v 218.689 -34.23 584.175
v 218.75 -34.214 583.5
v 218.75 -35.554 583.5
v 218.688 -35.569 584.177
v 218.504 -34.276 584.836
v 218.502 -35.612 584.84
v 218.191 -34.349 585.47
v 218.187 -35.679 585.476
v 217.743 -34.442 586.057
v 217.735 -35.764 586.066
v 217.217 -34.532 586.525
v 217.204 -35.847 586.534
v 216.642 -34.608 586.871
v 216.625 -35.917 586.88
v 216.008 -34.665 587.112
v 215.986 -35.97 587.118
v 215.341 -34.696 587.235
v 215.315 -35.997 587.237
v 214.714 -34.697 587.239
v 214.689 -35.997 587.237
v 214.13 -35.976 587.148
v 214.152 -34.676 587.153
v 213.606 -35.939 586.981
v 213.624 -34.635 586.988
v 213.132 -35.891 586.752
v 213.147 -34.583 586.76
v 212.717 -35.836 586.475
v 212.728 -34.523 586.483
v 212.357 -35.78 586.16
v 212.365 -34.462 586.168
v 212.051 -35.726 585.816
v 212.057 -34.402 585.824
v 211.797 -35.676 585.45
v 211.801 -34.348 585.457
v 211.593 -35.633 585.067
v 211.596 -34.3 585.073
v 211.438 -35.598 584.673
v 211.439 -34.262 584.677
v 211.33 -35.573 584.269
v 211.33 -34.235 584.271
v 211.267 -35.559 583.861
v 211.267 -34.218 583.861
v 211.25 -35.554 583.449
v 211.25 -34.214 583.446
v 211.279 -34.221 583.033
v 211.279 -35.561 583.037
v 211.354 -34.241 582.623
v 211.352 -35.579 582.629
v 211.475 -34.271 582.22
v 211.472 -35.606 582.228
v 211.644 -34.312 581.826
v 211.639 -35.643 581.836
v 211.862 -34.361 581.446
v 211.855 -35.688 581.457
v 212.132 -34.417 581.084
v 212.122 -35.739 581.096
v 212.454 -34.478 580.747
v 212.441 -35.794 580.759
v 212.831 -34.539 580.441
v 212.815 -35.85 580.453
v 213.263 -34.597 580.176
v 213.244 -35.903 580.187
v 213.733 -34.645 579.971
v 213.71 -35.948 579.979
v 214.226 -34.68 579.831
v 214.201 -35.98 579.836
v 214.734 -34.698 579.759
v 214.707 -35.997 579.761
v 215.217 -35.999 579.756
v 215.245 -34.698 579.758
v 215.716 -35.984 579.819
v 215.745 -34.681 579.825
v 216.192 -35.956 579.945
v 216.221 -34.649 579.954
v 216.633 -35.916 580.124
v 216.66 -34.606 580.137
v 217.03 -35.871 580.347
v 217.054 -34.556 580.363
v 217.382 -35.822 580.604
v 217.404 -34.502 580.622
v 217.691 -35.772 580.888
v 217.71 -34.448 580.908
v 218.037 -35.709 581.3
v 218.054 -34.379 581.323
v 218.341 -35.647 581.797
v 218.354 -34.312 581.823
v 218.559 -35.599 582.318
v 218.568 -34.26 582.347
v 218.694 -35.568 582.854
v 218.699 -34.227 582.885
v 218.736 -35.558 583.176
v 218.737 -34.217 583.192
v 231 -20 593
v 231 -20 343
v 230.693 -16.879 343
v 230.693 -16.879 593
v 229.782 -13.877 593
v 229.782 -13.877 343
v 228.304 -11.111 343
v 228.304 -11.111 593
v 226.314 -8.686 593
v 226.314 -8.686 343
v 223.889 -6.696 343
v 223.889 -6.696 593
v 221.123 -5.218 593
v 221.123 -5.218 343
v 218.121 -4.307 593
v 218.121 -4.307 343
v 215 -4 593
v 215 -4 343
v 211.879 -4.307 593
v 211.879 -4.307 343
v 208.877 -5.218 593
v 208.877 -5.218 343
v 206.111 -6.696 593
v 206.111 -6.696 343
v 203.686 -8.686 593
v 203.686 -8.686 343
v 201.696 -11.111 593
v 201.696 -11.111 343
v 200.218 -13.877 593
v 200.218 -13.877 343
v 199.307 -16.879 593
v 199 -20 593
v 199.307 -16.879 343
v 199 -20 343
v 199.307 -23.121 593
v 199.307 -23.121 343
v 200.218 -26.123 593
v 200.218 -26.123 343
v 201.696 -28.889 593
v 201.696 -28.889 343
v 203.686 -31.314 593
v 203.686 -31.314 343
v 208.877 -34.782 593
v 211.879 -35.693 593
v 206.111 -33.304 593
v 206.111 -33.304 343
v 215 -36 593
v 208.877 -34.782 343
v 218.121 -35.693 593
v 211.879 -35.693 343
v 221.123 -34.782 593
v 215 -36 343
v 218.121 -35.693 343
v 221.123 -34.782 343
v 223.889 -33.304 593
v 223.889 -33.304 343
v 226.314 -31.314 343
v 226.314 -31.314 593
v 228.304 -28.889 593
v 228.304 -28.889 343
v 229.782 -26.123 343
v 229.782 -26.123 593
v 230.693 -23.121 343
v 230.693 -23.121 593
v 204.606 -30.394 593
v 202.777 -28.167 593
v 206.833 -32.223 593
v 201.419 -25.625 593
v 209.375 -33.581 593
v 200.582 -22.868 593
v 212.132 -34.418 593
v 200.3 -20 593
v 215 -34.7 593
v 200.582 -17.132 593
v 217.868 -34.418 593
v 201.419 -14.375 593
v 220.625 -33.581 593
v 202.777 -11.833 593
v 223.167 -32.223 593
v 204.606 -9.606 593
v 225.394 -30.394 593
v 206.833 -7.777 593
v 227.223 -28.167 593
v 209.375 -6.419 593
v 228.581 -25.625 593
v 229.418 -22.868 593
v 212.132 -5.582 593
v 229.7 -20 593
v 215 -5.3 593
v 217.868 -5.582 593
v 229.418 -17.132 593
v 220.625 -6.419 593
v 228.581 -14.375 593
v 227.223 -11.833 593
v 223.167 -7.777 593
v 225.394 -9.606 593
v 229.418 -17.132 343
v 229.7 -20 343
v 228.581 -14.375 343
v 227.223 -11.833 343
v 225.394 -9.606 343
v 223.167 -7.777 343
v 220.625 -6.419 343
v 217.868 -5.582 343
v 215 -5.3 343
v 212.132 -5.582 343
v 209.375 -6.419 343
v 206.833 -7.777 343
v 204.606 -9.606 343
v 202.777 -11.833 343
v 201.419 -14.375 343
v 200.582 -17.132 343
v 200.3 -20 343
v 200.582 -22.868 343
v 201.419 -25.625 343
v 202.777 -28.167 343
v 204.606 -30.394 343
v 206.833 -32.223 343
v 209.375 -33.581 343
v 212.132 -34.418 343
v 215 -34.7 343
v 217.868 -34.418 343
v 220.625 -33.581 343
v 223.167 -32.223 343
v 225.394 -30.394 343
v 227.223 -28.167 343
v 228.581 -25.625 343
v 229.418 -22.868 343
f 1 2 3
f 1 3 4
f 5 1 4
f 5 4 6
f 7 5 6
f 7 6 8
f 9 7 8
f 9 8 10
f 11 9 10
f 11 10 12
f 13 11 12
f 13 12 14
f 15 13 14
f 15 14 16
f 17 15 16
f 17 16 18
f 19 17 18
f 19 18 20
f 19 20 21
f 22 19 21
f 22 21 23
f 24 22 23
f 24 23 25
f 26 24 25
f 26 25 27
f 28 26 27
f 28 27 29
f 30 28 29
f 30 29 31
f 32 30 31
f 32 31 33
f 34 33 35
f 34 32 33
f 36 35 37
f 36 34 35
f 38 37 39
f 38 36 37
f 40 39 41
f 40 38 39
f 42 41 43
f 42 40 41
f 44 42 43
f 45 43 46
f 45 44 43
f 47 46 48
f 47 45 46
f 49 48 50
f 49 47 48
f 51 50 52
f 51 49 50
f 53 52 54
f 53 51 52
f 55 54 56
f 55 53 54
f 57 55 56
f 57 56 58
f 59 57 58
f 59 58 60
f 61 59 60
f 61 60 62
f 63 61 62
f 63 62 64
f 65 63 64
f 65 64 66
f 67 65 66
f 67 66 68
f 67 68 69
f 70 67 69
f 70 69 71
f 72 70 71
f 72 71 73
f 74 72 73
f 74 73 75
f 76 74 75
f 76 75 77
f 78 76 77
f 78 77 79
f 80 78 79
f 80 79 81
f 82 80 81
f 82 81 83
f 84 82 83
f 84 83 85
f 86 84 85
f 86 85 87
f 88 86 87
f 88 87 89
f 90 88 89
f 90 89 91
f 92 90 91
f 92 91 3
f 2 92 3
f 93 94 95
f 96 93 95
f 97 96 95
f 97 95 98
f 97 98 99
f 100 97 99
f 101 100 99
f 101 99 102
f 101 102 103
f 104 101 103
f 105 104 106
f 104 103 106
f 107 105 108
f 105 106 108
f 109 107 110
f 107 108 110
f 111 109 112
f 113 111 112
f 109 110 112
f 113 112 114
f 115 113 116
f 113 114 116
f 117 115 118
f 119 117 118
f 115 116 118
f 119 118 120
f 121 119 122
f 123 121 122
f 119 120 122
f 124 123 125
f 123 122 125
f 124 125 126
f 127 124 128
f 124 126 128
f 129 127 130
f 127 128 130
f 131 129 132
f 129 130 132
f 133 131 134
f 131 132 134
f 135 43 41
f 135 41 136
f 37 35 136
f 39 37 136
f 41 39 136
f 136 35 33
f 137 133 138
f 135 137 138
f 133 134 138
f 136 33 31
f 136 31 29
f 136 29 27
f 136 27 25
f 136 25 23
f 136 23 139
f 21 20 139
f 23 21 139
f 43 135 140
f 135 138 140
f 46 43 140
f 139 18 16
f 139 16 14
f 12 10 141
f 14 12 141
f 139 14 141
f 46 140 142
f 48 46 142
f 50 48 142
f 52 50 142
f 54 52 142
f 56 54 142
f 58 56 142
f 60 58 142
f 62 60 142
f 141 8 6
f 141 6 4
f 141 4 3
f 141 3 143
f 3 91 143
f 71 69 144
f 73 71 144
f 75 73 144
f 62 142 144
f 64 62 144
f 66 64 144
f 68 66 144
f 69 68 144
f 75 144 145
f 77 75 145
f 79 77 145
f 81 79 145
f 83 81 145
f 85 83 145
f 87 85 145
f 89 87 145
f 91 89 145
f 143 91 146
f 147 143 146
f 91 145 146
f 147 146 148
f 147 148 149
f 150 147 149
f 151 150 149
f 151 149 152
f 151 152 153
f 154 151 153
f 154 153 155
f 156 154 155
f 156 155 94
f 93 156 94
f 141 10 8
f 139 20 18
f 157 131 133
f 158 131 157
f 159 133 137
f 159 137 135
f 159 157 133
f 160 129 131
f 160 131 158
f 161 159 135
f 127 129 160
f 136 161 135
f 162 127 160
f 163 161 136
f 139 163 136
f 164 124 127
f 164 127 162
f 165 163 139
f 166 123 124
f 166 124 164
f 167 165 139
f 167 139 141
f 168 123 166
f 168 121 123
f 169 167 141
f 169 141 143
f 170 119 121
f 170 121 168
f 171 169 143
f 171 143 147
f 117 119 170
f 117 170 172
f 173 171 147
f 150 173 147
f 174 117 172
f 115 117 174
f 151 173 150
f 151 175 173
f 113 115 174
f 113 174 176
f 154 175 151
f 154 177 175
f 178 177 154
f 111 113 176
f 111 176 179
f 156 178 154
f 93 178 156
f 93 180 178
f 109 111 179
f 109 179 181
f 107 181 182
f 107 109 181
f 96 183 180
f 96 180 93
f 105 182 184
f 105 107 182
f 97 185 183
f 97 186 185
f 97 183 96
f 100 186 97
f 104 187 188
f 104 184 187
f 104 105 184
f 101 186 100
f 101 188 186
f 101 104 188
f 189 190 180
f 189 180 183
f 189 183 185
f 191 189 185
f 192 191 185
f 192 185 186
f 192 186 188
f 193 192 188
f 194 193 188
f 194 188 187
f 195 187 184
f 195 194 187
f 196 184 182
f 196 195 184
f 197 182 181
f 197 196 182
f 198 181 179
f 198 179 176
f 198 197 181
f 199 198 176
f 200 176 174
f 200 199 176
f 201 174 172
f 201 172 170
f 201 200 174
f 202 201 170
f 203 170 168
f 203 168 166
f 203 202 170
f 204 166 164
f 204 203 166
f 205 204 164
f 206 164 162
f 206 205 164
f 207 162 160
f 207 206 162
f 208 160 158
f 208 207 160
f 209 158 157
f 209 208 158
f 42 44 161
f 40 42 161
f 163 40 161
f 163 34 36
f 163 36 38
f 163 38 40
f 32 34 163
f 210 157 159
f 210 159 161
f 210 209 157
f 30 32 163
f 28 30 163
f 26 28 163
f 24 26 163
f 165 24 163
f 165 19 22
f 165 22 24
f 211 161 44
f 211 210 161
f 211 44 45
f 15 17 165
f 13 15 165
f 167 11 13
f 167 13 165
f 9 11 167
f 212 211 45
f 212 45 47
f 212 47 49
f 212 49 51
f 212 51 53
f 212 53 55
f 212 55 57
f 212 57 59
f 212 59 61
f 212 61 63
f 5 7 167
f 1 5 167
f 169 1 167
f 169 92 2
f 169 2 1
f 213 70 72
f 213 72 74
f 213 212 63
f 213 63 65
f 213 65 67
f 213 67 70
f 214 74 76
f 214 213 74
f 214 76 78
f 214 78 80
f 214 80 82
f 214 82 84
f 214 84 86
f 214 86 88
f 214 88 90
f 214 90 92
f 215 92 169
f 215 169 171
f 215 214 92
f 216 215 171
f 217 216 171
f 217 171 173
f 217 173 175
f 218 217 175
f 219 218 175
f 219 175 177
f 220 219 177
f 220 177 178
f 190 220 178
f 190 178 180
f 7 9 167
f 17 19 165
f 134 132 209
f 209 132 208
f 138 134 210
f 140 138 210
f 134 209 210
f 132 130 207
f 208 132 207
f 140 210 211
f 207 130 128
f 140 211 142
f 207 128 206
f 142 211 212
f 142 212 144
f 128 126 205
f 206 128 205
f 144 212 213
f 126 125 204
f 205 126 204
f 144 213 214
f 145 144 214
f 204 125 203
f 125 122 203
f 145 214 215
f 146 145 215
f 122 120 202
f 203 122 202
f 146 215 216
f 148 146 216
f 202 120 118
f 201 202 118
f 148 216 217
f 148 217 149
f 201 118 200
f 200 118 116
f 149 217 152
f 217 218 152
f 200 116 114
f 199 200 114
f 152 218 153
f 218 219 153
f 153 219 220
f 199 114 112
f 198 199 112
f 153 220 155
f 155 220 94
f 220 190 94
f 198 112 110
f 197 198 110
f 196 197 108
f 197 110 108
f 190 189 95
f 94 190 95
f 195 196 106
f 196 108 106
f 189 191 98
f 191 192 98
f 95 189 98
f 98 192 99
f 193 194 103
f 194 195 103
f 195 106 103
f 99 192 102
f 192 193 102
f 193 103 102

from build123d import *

# Parameters (mm, degrees)
CYLINDER208_R     = 3.75
CYLINDER208_DEPTH = 10
TUBE006_R         = 16
TUBE006_R_2       = 14.7
TUBE006_DEPTH     = 250


with BuildPart() as cylinder208:
    # Cylinder208 → Cylinder208 (new body)
    with BuildSketch(Plane(origin=(0, -8, -36.5), x_dir=(1, 0, 0), z_dir=(0, -1, 0))):
        Circle(CYLINDER208_R)
    extrude(amount=CYLINDER208_DEPTH)


with BuildPart() as metalholder:
    # Tube006 → Tube006 (new body)
    with BuildSketch(Plane.XY.offset(-277)):
        Circle(TUBE006_R)
        Circle(TUBE006_R_2, mode=Mode.SUBTRACT)
    extrude(amount=TUBE006_DEPTH)

    # Cut150: cut Cylinder208
    add(cylinder208.part, mode=Mode.SUBTRACT)


with BuildPart() as metalholder_1:
    # Cut150 placement: moved
    add(metalholder.part.moved(Location((215, -20, 620))))


solid = metalholder_1.part
